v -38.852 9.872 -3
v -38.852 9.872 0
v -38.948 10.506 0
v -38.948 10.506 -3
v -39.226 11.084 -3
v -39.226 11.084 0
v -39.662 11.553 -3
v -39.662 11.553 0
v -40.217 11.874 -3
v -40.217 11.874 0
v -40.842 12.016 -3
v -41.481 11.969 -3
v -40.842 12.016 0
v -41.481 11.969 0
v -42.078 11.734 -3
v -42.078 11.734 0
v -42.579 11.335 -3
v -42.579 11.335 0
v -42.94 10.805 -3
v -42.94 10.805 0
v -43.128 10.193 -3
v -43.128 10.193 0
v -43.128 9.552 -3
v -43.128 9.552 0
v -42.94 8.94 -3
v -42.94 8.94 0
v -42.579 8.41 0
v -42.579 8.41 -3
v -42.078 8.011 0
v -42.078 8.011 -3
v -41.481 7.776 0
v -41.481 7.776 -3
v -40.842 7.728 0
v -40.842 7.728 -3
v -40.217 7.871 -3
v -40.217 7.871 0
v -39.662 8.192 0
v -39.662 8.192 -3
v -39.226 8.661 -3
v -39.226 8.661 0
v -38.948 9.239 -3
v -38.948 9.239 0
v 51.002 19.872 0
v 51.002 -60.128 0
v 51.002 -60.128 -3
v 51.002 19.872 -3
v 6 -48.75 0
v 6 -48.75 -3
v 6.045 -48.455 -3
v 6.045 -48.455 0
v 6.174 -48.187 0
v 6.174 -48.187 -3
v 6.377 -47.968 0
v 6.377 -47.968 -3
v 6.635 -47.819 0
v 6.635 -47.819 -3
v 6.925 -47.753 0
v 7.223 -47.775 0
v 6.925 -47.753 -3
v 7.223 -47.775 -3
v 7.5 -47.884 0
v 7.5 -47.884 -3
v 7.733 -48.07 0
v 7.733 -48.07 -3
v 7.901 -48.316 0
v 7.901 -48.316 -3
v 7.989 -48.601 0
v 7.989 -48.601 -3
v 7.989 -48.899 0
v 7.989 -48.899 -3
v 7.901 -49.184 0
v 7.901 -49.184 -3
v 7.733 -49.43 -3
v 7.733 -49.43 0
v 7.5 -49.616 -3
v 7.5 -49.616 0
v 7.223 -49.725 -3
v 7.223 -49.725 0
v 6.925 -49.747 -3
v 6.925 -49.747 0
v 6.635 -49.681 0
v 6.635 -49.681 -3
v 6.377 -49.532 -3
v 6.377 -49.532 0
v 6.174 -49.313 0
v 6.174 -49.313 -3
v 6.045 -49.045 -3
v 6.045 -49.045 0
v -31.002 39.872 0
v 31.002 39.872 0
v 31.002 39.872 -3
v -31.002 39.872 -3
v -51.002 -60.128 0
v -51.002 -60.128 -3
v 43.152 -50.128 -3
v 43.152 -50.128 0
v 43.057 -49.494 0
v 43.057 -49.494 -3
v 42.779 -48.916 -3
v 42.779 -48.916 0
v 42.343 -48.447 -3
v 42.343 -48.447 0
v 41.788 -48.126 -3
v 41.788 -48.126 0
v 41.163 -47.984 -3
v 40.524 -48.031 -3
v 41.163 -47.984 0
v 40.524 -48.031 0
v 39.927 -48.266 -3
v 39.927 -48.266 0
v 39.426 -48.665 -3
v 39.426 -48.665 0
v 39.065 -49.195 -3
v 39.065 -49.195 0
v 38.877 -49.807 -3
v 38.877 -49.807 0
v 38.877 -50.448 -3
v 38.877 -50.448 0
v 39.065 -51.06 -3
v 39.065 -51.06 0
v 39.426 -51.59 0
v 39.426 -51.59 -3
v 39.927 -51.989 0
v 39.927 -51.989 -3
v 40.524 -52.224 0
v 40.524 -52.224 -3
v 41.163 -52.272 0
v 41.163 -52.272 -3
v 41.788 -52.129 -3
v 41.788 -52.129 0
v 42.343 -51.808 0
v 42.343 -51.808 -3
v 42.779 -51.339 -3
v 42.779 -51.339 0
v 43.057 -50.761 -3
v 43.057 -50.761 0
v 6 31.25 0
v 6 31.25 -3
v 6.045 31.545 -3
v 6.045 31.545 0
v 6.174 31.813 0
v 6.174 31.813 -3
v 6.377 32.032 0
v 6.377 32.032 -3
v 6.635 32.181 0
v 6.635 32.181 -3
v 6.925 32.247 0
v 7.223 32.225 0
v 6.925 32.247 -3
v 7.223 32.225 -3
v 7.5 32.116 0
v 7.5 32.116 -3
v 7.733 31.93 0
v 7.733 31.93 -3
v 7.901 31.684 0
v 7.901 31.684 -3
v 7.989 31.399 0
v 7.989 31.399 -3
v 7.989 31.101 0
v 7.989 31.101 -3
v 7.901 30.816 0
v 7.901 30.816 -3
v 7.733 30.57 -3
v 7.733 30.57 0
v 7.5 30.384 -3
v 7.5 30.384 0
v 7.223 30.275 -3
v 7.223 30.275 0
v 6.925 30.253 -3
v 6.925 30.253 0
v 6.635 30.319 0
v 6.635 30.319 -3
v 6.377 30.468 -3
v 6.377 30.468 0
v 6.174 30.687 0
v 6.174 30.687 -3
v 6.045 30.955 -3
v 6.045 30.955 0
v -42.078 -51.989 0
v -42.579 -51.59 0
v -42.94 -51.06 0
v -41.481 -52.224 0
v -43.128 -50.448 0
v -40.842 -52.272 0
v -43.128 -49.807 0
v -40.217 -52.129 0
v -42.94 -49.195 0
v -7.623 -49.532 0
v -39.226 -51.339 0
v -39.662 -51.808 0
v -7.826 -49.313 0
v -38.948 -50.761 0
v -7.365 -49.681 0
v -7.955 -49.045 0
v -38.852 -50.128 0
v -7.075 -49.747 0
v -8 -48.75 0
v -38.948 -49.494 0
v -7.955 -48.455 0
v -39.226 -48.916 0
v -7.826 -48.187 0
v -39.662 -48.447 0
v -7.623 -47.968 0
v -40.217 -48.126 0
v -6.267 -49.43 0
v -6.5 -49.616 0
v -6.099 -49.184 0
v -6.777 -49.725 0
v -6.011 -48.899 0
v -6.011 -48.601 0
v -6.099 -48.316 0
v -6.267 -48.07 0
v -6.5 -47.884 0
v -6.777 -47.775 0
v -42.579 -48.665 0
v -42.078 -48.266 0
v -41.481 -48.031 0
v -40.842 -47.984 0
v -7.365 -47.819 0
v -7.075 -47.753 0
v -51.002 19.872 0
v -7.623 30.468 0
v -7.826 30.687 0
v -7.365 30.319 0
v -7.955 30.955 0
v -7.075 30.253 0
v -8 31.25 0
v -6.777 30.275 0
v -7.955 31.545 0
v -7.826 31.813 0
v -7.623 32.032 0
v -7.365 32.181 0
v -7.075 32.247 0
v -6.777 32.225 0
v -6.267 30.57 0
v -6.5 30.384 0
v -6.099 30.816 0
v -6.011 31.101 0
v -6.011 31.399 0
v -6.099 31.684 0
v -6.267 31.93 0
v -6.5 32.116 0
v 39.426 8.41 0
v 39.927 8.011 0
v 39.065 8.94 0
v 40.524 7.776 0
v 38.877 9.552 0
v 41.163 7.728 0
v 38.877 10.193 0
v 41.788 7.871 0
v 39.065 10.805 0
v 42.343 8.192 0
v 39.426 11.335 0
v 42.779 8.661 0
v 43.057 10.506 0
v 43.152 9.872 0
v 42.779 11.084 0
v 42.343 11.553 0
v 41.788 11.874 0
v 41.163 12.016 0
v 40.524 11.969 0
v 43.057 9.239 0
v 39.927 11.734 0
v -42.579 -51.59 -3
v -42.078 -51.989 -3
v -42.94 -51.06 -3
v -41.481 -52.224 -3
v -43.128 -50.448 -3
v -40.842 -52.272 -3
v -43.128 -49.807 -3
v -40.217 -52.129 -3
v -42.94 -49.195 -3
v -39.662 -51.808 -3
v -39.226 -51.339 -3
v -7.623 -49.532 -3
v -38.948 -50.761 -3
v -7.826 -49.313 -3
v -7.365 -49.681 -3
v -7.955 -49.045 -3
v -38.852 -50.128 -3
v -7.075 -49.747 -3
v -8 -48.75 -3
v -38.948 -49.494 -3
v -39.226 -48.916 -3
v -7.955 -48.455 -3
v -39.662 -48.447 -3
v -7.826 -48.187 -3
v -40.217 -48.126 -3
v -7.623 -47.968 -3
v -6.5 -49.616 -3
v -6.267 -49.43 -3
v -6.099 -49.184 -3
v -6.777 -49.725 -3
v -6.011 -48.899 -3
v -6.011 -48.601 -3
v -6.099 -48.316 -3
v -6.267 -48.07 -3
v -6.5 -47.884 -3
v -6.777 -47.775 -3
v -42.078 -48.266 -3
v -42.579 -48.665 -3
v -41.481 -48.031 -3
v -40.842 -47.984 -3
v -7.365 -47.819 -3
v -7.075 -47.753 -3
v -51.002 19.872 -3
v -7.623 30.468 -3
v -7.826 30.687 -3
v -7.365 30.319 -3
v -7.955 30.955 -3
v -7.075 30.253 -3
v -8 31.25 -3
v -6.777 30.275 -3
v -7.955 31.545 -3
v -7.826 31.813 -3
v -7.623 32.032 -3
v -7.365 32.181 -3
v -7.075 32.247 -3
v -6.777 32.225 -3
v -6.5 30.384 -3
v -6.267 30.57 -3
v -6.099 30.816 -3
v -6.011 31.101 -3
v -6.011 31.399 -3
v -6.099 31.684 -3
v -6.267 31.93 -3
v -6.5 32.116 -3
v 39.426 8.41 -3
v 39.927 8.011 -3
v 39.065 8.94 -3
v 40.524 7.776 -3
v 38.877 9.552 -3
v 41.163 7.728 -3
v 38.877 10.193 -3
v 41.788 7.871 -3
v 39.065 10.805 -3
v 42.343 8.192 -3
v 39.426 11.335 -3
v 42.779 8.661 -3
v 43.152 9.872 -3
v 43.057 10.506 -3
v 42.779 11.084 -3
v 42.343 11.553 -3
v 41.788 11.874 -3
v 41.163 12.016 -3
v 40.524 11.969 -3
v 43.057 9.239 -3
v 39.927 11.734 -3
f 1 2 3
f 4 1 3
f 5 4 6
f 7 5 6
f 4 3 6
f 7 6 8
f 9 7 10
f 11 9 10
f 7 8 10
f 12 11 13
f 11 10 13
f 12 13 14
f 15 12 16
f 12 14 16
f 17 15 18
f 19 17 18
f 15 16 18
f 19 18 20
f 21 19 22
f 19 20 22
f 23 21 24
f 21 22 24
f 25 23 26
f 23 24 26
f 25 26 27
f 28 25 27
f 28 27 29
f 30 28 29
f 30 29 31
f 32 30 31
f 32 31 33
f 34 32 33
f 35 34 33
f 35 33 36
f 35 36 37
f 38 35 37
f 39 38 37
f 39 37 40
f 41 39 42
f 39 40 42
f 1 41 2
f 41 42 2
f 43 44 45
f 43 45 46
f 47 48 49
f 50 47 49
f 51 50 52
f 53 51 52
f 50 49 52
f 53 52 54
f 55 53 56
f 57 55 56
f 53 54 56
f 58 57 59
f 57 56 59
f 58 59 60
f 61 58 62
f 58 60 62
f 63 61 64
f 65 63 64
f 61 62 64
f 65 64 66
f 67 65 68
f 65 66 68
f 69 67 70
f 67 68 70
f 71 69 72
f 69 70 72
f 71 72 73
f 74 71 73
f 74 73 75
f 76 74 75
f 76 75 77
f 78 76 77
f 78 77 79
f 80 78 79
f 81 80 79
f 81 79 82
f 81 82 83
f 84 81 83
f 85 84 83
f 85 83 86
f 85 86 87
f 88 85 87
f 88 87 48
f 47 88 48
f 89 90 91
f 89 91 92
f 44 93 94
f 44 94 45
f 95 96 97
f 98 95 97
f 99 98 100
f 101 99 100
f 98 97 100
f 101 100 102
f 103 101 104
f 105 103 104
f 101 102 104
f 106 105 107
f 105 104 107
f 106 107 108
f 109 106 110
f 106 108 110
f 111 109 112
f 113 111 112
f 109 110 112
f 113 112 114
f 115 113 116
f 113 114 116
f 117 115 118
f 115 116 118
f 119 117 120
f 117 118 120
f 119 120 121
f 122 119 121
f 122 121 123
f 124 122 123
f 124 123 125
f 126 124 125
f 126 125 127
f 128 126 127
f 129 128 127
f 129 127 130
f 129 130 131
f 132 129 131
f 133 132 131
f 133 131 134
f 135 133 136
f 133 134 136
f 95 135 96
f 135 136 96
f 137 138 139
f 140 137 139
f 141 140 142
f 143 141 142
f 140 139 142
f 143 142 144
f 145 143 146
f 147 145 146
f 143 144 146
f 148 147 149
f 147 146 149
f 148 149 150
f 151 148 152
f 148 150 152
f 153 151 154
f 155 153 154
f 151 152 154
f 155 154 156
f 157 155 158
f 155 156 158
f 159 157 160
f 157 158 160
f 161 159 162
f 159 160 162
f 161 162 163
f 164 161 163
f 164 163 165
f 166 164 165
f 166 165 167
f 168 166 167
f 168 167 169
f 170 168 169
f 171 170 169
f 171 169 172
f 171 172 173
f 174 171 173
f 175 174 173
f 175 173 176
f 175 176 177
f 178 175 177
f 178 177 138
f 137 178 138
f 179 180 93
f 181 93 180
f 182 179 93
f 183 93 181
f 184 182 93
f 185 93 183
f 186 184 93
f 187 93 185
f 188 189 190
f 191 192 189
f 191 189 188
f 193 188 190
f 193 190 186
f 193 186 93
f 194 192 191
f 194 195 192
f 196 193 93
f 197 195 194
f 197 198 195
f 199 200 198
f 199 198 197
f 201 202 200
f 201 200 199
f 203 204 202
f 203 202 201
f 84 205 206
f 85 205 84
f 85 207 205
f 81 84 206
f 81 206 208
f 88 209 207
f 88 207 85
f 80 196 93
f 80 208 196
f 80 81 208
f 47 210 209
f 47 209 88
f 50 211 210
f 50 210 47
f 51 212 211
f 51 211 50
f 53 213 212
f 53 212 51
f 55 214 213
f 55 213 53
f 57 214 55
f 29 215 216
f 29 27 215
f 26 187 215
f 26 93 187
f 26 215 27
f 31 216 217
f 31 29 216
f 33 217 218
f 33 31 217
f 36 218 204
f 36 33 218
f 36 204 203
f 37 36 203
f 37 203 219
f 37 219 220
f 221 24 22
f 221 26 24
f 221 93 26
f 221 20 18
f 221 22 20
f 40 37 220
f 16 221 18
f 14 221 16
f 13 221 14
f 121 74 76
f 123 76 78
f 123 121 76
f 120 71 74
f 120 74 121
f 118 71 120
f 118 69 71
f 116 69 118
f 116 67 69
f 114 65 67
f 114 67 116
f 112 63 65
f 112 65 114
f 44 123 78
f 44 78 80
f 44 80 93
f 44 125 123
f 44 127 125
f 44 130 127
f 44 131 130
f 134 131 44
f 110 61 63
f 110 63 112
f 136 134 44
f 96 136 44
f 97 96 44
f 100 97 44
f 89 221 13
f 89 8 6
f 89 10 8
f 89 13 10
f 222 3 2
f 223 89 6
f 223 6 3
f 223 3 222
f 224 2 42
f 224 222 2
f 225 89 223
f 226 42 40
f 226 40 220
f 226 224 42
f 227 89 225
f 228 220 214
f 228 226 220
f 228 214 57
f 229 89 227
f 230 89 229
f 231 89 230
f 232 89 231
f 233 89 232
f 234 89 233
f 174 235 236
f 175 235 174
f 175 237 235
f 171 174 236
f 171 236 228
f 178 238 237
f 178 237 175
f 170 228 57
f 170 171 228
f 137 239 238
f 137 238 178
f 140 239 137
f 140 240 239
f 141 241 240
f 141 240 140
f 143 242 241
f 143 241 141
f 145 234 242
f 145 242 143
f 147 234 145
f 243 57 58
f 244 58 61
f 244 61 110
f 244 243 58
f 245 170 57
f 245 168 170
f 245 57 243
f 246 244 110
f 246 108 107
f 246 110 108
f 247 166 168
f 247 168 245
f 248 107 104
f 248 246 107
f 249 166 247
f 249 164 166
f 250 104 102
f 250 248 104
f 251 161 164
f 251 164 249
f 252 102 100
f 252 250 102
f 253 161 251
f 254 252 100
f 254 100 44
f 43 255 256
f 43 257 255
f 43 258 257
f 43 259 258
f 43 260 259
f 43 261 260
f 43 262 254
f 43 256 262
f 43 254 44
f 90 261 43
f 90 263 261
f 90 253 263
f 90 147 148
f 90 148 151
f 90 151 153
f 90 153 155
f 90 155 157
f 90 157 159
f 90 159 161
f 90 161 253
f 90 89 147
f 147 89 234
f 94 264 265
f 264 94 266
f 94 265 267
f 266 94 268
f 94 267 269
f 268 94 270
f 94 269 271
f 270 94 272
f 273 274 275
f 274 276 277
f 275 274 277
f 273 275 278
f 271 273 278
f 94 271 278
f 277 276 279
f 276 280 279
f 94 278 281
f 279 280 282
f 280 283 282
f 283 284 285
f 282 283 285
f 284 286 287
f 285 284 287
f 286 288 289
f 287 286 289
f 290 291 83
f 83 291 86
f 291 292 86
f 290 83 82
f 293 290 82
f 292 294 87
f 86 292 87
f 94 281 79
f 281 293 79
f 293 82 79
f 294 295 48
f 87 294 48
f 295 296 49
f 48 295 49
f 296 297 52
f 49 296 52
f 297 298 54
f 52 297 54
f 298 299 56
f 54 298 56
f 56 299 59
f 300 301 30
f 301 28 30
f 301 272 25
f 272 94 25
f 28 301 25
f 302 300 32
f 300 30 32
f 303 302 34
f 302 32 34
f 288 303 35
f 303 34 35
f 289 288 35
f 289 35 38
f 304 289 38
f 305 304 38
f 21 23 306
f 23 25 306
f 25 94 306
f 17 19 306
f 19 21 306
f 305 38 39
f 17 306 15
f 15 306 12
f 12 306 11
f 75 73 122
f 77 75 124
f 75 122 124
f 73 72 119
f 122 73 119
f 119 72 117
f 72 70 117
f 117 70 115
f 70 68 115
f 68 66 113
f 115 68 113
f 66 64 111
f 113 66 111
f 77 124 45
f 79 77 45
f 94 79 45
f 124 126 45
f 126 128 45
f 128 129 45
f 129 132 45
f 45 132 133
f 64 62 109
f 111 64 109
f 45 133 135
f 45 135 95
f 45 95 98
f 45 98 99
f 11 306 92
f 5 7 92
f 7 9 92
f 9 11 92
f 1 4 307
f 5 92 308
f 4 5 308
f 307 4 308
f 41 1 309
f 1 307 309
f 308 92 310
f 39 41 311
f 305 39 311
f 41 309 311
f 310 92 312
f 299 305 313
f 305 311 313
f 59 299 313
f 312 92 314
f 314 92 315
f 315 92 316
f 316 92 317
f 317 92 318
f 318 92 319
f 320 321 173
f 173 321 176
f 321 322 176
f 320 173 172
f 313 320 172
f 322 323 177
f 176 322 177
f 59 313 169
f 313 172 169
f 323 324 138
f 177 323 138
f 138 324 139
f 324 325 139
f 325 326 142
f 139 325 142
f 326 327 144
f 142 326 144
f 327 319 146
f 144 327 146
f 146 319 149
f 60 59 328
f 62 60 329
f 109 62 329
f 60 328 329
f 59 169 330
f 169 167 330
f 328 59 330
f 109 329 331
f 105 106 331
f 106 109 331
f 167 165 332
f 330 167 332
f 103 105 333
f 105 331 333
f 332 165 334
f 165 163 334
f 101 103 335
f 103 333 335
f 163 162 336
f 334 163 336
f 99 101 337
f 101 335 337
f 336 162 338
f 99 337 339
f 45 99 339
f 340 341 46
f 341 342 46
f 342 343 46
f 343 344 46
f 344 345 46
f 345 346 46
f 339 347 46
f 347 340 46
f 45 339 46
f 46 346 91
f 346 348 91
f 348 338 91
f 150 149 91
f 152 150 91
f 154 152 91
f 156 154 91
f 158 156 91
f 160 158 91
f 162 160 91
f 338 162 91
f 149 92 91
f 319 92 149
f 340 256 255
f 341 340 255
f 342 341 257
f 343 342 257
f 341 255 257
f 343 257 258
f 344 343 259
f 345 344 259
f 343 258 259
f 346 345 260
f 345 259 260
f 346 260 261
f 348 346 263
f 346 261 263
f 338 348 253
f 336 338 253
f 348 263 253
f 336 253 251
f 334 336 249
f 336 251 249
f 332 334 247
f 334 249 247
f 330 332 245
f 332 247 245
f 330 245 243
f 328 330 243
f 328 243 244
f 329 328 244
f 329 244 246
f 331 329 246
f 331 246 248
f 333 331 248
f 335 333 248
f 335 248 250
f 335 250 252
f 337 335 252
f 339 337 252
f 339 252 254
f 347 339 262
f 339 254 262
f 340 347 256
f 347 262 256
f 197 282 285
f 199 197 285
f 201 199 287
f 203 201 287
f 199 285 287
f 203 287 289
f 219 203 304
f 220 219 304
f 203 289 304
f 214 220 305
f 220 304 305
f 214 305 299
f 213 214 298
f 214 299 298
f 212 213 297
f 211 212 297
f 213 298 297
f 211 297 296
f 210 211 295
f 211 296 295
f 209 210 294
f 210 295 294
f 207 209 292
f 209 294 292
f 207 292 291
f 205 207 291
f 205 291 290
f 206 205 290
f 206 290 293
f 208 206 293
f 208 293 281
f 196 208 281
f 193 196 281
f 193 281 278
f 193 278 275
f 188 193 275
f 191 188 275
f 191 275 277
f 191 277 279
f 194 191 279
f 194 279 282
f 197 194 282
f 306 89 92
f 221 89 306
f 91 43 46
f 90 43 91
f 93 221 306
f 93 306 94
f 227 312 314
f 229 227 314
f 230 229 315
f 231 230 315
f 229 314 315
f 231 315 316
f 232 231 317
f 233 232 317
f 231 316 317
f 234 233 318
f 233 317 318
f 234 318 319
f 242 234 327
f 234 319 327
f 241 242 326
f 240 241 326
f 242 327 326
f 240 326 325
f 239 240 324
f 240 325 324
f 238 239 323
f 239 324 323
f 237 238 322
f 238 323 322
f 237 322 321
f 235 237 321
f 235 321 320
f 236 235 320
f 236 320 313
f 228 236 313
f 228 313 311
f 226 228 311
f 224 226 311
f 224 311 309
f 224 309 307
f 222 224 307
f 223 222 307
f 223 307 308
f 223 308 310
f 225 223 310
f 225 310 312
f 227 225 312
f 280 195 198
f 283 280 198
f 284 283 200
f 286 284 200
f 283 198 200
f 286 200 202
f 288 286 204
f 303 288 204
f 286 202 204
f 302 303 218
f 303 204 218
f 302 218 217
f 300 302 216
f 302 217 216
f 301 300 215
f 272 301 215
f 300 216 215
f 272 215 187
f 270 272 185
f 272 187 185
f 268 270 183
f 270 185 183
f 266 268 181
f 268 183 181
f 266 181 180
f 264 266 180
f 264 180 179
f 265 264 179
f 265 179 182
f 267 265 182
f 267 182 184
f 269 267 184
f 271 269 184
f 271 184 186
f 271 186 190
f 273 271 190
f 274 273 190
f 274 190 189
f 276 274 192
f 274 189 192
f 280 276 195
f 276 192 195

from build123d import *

# Parameters (mm, degrees)
EXTRUDE_1_DEPTH     = 3
SKETCH_2_R          = 2.15
CUT_EXTRUDE_1_DEPTH = 3
SKETCH_3_R          = 1
CUT_EXTRUDE_2_DEPTH = 70


with BuildPart() as part:
    # 草图1 → 凸台-拉伸1 (new body)
    with BuildSketch(Plane.XY):
        Polygon((-51.0025, -60.127538713), (51.0025, -60.127538713), (51.0025, 19.872461287), (31.0025, 39.872461287), (-31.0025, 39.872461287), (-51.0025, 19.872461287), align=None)
    extrude(amount=-EXTRUDE_1_DEPTH)

    # 草图2 → 切除-拉伸1 (cut)
    with BuildSketch(Plane.XY):
        with Locations((-41.0025, 9.872461287)):
            Circle(SKETCH_2_R)
        with Locations((-41.0025, -50.127538713)):
            Circle(SKETCH_2_R)
        with Locations((41.0025, 9.872461287)):
            Circle(SKETCH_2_R)
        with Locations((41.0025, -50.127538713)):
            Circle(SKETCH_2_R)
    extrude(amount=-CUT_EXTRUDE_1_DEPTH, mode=Mode.SUBTRACT)

    # 草图3 → 切除-拉伸2 (cut)
    with BuildSketch(Plane(origin=(0, 0, -3), x_dir=(-1, 0, 0), z_dir=(0, 0, -1))):
        with Locations((-7.000166, 31.25)):
            Circle(SKETCH_3_R)
        with Locations((6.999834, 31.25)):
            Circle(SKETCH_3_R)
        with Locations((-7.000166, -48.75)):
            Circle(SKETCH_3_R)
        with Locations((6.999834, -48.75)):
            Circle(SKETCH_3_R)
    extrude(amount=-CUT_EXTRUDE_2_DEPTH, mode=Mode.SUBTRACT)


solid = part.part
